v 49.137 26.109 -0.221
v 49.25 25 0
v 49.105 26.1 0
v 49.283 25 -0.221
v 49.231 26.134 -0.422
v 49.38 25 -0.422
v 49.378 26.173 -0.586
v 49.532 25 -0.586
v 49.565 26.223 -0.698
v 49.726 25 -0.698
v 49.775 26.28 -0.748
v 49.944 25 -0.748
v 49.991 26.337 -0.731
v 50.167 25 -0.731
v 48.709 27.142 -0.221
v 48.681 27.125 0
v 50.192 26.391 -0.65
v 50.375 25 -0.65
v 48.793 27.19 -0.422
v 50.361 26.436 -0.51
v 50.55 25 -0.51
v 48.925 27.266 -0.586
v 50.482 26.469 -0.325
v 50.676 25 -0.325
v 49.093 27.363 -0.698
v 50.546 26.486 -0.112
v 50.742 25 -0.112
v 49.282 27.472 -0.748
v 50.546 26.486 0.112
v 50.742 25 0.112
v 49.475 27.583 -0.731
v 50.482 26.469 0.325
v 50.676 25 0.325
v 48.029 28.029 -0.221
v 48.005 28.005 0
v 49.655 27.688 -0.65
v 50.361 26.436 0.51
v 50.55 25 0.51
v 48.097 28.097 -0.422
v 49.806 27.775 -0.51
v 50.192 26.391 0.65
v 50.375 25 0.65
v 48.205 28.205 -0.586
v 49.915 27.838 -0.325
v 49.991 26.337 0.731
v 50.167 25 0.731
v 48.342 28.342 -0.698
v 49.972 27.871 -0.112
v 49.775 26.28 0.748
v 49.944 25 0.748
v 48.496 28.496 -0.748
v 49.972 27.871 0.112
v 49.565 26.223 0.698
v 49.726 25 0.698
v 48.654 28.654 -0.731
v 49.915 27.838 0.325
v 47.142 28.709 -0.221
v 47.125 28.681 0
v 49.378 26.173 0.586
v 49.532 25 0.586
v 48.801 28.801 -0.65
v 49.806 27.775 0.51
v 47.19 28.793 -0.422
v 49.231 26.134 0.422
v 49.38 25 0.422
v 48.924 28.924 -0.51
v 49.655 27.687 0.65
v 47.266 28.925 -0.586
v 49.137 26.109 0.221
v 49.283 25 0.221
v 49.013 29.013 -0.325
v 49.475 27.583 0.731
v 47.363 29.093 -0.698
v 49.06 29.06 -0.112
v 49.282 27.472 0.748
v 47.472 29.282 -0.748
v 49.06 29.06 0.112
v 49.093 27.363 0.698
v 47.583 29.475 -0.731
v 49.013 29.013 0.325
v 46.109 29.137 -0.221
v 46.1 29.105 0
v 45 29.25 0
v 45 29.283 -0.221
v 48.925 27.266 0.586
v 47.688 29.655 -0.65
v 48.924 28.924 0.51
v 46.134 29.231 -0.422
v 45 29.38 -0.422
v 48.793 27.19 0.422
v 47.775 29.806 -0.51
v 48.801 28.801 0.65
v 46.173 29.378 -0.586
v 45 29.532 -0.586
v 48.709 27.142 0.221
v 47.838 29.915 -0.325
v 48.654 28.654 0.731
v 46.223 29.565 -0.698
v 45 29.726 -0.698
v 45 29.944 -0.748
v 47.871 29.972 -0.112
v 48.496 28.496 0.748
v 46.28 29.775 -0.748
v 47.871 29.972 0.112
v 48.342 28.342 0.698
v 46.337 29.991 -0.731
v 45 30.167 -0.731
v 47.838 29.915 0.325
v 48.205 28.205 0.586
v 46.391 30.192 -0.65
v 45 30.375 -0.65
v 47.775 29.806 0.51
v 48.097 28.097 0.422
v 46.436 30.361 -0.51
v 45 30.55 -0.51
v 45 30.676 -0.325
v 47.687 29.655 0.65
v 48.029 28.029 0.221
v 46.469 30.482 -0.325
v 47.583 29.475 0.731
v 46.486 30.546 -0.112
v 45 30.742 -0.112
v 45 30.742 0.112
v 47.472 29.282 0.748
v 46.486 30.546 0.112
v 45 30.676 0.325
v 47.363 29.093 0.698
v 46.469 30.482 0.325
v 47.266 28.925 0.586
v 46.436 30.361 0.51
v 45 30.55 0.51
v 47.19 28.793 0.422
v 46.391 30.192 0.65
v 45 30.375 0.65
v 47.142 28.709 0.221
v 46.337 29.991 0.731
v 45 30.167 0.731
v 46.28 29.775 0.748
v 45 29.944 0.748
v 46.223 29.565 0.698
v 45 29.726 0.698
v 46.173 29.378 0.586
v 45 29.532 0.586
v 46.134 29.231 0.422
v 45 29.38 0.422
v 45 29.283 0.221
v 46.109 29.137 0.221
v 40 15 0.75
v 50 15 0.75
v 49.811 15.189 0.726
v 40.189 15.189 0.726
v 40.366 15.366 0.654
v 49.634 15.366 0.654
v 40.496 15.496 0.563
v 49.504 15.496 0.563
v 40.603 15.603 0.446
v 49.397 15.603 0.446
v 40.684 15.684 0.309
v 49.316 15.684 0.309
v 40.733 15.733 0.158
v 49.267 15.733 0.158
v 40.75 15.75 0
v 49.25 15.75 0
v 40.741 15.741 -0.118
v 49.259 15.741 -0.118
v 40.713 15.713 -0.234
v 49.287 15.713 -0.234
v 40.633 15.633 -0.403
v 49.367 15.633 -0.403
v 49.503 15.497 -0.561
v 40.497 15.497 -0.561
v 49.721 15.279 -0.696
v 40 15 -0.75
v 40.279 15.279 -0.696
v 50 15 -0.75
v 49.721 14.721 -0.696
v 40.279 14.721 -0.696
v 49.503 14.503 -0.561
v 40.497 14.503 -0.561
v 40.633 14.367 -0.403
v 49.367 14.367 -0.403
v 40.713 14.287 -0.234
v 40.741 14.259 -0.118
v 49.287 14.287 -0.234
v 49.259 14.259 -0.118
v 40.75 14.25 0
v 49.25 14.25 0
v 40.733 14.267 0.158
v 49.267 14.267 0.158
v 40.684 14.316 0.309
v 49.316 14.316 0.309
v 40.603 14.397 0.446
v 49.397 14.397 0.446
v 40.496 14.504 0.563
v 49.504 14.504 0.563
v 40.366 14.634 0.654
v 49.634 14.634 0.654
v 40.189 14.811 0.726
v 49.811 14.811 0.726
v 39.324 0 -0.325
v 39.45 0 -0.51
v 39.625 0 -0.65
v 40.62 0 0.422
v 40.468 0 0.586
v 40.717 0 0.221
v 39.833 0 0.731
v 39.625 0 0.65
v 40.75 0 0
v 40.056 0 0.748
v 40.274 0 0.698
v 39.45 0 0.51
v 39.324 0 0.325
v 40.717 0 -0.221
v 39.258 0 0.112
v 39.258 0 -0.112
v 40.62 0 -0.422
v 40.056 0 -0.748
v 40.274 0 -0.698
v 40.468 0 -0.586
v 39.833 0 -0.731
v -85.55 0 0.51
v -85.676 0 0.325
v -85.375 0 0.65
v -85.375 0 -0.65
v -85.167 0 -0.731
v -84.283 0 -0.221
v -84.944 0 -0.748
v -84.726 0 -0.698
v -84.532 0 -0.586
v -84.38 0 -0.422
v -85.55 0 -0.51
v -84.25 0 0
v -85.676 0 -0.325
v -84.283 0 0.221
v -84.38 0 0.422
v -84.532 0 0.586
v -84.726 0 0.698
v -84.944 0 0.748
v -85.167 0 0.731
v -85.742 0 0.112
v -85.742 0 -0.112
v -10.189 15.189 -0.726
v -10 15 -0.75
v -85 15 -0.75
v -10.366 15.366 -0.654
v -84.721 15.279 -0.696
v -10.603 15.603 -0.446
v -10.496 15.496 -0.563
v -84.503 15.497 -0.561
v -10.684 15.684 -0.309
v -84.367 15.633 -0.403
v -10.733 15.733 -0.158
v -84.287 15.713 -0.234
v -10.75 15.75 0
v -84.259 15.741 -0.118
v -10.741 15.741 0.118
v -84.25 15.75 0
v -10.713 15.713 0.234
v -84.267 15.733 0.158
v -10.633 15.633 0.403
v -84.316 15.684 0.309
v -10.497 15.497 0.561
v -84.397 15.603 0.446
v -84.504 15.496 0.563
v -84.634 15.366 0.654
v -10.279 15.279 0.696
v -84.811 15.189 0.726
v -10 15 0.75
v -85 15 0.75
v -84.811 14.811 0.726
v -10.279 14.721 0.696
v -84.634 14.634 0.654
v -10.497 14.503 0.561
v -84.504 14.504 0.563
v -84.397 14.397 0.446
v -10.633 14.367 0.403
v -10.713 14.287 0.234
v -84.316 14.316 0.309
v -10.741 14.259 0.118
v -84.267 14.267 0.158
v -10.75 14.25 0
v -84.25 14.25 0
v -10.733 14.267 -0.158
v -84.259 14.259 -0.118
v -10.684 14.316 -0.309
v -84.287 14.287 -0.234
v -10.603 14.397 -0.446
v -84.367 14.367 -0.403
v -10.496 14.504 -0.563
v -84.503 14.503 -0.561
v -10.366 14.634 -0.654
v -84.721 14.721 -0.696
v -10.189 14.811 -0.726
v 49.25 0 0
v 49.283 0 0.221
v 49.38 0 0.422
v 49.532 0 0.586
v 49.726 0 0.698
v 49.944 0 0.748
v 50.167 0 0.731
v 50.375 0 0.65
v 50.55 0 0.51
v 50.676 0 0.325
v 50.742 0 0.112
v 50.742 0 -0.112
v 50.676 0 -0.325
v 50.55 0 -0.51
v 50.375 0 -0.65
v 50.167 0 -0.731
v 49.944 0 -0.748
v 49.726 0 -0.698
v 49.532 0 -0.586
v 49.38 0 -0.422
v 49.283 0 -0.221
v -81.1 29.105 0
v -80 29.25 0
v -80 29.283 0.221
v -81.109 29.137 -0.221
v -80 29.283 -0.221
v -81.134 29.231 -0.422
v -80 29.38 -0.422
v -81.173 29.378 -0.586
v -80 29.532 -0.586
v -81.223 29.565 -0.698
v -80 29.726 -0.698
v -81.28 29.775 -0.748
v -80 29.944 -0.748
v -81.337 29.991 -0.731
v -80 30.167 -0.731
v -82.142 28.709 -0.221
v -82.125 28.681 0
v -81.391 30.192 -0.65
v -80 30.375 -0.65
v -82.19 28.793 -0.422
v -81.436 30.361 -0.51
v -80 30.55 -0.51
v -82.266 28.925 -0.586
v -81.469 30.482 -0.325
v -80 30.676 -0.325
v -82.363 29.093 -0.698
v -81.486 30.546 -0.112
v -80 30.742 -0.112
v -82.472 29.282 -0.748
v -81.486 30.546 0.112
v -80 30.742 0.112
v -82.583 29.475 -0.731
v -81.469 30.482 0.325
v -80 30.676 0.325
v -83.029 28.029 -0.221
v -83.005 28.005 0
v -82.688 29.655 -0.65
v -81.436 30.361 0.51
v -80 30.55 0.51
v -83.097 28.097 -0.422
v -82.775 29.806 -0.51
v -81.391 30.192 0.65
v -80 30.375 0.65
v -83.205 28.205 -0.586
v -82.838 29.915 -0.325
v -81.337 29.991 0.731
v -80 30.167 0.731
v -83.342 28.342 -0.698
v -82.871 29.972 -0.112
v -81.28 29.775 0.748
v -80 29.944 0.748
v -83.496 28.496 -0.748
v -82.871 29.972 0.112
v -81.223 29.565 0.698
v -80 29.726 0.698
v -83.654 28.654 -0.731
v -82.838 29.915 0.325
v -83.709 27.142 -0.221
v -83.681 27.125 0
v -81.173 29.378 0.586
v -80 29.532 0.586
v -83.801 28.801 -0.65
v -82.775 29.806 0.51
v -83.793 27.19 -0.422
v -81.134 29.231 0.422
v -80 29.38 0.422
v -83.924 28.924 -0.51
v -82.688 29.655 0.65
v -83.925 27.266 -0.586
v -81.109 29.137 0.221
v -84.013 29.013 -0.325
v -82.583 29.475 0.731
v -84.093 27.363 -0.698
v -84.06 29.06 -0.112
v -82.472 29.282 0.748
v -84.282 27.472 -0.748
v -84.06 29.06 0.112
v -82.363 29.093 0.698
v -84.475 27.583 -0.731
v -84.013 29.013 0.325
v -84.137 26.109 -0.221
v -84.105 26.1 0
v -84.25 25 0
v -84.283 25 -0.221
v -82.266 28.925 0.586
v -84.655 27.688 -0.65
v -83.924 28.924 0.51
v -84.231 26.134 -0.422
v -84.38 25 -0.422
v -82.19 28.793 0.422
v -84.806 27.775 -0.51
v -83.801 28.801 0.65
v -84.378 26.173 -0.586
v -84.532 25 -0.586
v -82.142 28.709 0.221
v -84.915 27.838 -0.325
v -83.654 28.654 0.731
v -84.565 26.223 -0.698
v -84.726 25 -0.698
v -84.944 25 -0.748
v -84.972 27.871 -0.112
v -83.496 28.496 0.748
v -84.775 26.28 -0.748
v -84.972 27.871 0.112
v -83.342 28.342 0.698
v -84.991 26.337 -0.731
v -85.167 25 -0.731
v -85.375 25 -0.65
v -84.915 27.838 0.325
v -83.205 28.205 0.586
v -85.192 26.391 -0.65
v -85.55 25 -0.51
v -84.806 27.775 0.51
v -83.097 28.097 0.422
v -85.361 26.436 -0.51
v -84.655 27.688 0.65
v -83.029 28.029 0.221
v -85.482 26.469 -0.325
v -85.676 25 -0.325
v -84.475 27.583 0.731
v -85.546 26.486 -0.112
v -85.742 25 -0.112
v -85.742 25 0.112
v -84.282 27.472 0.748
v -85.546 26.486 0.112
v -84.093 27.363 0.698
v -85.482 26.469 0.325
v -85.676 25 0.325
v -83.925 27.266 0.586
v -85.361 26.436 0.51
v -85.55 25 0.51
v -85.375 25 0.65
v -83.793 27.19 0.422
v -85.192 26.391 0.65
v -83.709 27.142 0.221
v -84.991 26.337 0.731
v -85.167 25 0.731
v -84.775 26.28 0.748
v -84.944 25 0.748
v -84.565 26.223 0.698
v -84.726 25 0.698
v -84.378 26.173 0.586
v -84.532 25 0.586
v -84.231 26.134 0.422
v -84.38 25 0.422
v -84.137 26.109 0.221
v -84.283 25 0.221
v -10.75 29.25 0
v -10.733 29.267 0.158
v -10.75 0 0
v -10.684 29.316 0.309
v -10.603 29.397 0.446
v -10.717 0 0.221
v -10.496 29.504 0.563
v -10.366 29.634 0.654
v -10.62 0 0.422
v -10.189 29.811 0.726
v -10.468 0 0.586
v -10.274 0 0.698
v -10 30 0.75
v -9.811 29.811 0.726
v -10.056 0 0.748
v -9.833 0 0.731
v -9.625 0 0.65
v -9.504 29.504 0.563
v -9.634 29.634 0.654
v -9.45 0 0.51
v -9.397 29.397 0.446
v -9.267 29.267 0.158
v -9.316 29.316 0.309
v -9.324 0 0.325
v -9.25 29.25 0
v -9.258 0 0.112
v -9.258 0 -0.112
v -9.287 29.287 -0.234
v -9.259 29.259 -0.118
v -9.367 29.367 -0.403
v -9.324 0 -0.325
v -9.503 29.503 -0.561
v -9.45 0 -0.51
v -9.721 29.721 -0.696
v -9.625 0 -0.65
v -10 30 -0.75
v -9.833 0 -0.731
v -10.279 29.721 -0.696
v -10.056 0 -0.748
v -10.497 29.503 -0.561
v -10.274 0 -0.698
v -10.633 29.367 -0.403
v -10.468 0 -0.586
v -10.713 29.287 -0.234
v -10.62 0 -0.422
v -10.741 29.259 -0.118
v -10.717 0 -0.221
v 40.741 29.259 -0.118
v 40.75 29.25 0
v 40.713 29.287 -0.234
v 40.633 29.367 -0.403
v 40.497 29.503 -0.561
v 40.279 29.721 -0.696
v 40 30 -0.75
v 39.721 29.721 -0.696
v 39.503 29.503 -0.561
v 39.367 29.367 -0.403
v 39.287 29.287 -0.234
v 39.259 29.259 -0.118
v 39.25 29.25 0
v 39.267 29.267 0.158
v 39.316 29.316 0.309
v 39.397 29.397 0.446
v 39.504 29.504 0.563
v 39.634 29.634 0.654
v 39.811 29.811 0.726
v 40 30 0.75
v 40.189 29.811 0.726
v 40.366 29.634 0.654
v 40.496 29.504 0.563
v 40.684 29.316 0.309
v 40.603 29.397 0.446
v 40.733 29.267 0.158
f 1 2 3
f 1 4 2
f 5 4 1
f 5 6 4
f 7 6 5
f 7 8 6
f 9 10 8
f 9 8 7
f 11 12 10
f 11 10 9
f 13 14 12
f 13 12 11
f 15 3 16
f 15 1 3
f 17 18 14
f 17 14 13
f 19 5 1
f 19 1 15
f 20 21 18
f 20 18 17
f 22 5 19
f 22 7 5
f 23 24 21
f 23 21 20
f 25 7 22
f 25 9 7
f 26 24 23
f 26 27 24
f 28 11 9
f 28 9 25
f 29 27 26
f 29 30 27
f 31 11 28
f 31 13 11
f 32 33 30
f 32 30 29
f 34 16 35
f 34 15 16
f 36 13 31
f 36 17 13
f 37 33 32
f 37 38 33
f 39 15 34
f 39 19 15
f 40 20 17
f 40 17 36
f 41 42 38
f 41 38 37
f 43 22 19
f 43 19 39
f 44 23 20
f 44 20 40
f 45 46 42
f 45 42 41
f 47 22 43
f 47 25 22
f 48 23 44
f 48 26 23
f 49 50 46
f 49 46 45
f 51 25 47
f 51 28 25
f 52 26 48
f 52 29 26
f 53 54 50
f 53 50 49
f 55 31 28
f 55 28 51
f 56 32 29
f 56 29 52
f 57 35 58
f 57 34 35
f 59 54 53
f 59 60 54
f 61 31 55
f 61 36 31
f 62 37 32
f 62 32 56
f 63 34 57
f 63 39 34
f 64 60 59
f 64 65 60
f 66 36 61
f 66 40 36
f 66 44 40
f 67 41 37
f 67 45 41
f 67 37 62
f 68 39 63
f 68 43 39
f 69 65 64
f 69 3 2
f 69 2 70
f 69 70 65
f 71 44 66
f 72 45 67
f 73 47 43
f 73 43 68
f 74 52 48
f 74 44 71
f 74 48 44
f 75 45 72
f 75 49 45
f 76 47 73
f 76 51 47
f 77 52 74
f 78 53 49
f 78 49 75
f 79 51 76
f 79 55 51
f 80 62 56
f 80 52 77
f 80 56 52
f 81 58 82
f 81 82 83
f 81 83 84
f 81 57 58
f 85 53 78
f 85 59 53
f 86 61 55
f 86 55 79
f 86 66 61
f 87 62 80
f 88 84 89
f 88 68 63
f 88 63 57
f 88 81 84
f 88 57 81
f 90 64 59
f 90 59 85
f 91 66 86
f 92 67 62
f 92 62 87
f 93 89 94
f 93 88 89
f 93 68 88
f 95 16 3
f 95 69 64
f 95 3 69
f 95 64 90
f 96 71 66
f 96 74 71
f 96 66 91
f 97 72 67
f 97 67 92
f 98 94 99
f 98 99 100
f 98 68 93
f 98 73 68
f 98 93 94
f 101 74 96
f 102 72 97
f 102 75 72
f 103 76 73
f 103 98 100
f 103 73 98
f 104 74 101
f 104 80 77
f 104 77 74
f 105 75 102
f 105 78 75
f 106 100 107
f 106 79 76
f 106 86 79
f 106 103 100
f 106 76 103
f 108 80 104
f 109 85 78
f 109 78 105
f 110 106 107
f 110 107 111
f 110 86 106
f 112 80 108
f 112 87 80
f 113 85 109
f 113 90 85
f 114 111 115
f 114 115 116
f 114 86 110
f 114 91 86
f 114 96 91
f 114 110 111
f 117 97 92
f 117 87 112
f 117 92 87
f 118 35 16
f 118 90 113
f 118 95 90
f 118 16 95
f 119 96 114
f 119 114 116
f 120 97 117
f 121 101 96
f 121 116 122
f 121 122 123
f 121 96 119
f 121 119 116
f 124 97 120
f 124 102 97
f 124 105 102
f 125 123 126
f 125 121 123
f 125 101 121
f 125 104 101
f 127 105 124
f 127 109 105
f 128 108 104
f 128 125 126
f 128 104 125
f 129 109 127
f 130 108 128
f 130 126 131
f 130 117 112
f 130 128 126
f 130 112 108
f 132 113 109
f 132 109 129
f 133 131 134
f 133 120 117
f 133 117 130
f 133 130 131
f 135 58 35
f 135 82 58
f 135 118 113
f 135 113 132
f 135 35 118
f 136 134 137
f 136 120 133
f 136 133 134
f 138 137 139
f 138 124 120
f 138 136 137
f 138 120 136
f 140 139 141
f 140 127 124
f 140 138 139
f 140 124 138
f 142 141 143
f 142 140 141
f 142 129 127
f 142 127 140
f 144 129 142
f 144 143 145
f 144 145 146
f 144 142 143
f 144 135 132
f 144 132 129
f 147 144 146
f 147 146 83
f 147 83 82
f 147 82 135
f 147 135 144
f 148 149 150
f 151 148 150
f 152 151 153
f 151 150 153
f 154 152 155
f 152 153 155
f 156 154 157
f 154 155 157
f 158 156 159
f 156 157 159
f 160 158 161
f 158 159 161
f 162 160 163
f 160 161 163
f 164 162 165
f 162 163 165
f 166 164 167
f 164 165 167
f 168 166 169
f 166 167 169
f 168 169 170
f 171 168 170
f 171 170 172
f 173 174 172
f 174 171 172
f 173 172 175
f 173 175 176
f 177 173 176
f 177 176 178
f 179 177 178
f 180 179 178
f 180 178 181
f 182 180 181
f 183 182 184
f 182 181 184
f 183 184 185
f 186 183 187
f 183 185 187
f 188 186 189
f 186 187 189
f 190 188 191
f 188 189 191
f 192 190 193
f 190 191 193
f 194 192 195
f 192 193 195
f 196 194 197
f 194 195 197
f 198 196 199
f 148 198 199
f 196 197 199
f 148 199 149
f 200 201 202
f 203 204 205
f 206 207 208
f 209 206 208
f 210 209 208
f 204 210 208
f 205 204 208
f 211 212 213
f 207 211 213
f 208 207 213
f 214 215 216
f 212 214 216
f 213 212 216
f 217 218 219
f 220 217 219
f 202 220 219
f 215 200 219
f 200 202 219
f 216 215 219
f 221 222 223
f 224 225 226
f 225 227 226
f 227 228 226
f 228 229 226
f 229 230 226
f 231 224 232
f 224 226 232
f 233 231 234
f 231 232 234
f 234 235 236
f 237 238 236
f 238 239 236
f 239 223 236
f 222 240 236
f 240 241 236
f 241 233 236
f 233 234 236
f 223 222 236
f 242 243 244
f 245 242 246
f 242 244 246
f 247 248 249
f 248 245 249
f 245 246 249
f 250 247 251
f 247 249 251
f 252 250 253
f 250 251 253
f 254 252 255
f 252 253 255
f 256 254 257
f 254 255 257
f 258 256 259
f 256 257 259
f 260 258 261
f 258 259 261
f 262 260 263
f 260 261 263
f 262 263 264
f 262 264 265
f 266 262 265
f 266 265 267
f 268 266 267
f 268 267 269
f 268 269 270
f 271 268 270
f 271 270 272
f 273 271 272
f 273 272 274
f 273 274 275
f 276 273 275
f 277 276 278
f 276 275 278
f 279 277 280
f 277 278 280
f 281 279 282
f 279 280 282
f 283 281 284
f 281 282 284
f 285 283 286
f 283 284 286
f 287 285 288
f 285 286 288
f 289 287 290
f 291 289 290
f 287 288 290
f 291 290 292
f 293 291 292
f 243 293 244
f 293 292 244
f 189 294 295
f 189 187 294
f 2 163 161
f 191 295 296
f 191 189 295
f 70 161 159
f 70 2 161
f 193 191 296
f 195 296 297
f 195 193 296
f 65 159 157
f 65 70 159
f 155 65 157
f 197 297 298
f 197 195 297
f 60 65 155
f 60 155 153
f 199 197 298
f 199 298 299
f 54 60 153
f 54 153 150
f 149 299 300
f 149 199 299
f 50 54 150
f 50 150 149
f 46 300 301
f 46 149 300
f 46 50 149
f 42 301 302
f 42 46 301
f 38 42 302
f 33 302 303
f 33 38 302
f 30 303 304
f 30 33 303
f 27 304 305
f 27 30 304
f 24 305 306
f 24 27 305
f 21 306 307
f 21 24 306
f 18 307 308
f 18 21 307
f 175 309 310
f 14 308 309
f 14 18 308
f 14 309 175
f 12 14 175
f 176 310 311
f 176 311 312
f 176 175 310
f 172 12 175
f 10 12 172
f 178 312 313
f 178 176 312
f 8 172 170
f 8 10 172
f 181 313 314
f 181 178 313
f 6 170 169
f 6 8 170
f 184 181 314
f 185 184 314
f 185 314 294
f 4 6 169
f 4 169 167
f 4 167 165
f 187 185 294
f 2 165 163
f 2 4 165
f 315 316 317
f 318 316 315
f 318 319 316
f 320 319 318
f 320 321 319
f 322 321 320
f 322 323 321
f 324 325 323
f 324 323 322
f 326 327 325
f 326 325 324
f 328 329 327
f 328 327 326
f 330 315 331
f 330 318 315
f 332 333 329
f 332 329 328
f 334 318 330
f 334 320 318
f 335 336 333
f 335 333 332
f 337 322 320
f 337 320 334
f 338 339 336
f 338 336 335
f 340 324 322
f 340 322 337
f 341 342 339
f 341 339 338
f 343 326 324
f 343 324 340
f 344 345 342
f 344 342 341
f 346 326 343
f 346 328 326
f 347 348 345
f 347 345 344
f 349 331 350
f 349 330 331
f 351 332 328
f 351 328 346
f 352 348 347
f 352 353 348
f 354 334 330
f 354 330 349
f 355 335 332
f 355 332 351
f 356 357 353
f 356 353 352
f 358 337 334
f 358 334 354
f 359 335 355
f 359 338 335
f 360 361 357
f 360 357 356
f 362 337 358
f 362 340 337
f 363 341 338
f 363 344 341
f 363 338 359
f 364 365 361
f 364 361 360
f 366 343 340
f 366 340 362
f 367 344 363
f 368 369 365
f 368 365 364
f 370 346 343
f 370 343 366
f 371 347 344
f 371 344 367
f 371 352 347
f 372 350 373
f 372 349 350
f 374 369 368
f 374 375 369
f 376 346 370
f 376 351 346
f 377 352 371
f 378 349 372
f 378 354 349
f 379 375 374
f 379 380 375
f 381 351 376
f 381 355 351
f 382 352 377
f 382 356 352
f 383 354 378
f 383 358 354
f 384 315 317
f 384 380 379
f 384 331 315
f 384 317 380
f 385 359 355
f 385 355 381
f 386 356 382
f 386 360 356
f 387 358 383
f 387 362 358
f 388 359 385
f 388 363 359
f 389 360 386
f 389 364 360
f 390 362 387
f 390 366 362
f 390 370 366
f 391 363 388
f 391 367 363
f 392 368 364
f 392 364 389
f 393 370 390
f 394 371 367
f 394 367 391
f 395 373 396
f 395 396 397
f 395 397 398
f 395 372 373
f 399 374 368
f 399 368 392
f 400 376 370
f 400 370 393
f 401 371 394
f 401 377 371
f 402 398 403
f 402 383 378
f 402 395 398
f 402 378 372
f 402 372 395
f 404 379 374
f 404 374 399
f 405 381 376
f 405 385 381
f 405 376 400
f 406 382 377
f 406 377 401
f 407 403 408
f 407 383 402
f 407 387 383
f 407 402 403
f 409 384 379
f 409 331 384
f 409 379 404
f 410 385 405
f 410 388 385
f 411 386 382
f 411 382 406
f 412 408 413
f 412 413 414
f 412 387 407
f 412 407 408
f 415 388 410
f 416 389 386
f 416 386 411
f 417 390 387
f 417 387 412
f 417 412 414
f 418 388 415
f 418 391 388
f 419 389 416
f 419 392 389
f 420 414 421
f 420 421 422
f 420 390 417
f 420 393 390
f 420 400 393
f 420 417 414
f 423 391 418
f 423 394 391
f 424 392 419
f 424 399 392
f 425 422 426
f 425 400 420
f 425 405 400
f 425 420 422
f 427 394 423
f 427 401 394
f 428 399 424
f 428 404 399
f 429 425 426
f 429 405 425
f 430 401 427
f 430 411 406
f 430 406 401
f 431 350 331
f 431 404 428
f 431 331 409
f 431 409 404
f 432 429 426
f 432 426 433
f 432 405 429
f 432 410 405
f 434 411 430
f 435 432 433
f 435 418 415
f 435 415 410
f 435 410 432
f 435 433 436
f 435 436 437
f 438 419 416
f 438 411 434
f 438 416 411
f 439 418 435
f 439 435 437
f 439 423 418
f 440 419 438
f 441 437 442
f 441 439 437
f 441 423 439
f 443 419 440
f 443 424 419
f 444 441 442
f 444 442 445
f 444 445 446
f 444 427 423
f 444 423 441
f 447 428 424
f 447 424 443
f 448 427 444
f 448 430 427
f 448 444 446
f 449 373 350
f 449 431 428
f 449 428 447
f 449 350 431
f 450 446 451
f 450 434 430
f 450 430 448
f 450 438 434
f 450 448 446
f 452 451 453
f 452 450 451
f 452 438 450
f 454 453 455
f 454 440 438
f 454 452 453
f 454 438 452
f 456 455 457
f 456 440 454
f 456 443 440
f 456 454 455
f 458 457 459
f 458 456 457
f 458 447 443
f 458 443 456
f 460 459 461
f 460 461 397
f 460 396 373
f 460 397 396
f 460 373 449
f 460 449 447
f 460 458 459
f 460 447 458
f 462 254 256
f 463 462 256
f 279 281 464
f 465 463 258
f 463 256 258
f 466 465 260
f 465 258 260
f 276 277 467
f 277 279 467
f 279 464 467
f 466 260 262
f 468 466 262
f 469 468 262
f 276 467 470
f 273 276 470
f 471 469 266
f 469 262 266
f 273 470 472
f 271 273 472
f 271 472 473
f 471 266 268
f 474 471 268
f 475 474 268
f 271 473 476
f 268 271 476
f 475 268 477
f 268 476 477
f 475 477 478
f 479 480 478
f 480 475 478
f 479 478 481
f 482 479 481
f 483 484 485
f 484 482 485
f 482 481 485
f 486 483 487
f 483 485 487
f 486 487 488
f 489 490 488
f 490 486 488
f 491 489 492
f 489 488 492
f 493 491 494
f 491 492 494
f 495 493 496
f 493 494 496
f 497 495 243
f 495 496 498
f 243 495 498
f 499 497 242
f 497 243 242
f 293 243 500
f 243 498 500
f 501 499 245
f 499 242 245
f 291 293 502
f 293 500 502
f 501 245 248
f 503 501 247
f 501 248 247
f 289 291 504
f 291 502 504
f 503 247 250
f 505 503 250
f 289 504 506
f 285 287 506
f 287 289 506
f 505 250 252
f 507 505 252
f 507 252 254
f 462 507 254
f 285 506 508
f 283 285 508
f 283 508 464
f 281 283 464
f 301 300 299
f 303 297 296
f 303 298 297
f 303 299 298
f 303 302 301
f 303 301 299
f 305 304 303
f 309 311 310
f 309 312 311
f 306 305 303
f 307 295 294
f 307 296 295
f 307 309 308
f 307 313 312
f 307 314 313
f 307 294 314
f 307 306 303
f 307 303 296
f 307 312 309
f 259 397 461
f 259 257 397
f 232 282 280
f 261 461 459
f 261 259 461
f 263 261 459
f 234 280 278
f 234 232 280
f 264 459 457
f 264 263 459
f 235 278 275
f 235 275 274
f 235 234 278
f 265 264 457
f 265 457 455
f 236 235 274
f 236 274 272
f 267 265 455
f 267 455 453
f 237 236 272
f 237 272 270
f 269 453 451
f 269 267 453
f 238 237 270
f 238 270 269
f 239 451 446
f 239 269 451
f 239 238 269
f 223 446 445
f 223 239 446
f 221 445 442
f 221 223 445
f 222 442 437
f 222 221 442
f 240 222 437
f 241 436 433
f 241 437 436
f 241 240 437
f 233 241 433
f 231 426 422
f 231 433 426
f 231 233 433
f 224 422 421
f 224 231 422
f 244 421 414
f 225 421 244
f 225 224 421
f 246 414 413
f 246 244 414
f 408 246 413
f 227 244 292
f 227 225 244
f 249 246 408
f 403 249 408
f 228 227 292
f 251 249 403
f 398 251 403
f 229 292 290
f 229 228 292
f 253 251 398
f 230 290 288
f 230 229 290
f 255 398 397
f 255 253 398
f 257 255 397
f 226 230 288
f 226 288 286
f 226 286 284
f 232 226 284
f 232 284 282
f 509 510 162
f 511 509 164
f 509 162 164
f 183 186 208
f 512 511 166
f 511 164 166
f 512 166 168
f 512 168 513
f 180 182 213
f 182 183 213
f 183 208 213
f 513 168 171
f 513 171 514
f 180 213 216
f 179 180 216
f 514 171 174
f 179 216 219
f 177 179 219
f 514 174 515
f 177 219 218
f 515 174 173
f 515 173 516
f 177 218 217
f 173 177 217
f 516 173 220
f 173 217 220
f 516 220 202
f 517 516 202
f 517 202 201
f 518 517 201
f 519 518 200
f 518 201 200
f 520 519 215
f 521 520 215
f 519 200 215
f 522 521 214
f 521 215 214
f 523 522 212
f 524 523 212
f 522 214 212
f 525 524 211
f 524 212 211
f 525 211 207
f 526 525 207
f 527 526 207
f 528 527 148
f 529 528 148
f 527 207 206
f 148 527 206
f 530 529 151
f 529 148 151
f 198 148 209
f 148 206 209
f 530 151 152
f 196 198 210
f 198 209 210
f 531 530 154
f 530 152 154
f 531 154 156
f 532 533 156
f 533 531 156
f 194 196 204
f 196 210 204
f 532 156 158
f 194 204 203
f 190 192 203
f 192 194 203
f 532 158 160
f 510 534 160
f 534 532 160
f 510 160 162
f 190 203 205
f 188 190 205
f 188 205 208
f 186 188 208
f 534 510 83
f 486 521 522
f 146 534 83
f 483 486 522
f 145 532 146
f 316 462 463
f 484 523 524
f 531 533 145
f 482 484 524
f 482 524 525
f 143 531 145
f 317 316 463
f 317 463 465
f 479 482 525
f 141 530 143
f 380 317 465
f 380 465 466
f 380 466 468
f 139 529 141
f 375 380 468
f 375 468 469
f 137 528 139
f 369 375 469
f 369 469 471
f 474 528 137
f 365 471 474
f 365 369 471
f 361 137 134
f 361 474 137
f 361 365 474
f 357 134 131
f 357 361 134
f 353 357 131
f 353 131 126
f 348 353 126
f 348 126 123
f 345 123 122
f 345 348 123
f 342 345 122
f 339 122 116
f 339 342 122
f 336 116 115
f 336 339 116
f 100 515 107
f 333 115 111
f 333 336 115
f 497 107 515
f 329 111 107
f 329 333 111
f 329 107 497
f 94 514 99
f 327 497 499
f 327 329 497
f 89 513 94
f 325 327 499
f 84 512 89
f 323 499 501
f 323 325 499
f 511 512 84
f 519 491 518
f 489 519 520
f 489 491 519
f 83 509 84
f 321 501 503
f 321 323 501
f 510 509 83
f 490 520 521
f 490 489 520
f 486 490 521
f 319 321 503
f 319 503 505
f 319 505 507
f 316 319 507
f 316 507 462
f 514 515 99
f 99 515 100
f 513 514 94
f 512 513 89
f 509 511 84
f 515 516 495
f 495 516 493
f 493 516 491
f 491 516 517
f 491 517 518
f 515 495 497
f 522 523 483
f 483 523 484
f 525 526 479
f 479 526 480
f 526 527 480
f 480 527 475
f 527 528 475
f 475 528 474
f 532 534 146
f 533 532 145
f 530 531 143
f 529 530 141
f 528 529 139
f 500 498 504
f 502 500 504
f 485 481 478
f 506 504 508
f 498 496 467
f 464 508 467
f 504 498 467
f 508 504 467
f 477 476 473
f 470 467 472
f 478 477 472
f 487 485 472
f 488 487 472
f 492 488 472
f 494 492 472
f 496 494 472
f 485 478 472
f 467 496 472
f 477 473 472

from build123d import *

# Parameters (mm, degrees)
SKETCH_2_R       = 0.75
SKETCH_13_R      = 0.75
EXTRUDE_7_DEPTH  = 30
SKETCH_14_R      = 0.75
EXTRUDE_8_DEPTH  = 30
SKETCH_15_R      = 0.75
EXTRUDE_9_DEPTH  = 75
SKETCH_17_R      = 0.75
EXTRUDE_10_DEPTH = 10


with BuildPart() as part:
    # 扫描1: sweep along a path in 草图1
    with BuildLine(Plane.XY) as sweep_1_path:
        Line((50, 0), (50, 25))
        ThreePointArc((50, 25), (48.535533906, 28.535533906), (45, 30))
        Line((45, 30), (-80, 30))
        ThreePointArc((-80, 30), (-83.535533906, 28.535533906), (-85, 25))
        Line((-85, 25), (-85, 0))
    # 草图2 → 扫描1 (sweep)
    with BuildSketch(Plane(origin=(0, 0, 0), x_dir=(1, 0, 0), z_dir=(0, 1, 0))):
        with Locations((-85, 0)):
            Circle(SKETCH_2_R)
    sweep(path=sweep_1_path.line)

    # 草图13 → 凸台-拉伸7 (add)
    with BuildSketch(Plane(origin=(0, 0, 0), x_dir=(1, 0, 0), z_dir=(0, 1, 0))):
        with Locations((40, 0)):
            Circle(SKETCH_13_R)
    extrude(amount=EXTRUDE_7_DEPTH)

    # 草图14 → 凸台-拉伸8 (add)
    with BuildSketch(Plane(origin=(0, 0, 0), x_dir=(-1, 0, 0), z_dir=(0, 1, 0))):
        with Locations((10, 0)):
            Circle(SKETCH_14_R)
    extrude(amount=EXTRUDE_8_DEPTH)

    # 草图15 → 凸台-拉伸9 (add)
    with BuildSketch(Plane(origin=(-85, 0, 0), x_dir=(0, 0, -1), z_dir=(1, 0, 0))):
        with Locations((0, 15)):
            Circle(SKETCH_15_R)
    extrude(amount=EXTRUDE_9_DEPTH)

    # 草图17 → 凸台-拉伸10 (add)
    with BuildSketch(Plane(origin=(50, 15, 0), x_dir=(0, 0, 1), z_dir=(-1, 0, 0))):
        Circle(SKETCH_17_R)
    extrude(amount=EXTRUDE_10_DEPTH)


solid = part.part
